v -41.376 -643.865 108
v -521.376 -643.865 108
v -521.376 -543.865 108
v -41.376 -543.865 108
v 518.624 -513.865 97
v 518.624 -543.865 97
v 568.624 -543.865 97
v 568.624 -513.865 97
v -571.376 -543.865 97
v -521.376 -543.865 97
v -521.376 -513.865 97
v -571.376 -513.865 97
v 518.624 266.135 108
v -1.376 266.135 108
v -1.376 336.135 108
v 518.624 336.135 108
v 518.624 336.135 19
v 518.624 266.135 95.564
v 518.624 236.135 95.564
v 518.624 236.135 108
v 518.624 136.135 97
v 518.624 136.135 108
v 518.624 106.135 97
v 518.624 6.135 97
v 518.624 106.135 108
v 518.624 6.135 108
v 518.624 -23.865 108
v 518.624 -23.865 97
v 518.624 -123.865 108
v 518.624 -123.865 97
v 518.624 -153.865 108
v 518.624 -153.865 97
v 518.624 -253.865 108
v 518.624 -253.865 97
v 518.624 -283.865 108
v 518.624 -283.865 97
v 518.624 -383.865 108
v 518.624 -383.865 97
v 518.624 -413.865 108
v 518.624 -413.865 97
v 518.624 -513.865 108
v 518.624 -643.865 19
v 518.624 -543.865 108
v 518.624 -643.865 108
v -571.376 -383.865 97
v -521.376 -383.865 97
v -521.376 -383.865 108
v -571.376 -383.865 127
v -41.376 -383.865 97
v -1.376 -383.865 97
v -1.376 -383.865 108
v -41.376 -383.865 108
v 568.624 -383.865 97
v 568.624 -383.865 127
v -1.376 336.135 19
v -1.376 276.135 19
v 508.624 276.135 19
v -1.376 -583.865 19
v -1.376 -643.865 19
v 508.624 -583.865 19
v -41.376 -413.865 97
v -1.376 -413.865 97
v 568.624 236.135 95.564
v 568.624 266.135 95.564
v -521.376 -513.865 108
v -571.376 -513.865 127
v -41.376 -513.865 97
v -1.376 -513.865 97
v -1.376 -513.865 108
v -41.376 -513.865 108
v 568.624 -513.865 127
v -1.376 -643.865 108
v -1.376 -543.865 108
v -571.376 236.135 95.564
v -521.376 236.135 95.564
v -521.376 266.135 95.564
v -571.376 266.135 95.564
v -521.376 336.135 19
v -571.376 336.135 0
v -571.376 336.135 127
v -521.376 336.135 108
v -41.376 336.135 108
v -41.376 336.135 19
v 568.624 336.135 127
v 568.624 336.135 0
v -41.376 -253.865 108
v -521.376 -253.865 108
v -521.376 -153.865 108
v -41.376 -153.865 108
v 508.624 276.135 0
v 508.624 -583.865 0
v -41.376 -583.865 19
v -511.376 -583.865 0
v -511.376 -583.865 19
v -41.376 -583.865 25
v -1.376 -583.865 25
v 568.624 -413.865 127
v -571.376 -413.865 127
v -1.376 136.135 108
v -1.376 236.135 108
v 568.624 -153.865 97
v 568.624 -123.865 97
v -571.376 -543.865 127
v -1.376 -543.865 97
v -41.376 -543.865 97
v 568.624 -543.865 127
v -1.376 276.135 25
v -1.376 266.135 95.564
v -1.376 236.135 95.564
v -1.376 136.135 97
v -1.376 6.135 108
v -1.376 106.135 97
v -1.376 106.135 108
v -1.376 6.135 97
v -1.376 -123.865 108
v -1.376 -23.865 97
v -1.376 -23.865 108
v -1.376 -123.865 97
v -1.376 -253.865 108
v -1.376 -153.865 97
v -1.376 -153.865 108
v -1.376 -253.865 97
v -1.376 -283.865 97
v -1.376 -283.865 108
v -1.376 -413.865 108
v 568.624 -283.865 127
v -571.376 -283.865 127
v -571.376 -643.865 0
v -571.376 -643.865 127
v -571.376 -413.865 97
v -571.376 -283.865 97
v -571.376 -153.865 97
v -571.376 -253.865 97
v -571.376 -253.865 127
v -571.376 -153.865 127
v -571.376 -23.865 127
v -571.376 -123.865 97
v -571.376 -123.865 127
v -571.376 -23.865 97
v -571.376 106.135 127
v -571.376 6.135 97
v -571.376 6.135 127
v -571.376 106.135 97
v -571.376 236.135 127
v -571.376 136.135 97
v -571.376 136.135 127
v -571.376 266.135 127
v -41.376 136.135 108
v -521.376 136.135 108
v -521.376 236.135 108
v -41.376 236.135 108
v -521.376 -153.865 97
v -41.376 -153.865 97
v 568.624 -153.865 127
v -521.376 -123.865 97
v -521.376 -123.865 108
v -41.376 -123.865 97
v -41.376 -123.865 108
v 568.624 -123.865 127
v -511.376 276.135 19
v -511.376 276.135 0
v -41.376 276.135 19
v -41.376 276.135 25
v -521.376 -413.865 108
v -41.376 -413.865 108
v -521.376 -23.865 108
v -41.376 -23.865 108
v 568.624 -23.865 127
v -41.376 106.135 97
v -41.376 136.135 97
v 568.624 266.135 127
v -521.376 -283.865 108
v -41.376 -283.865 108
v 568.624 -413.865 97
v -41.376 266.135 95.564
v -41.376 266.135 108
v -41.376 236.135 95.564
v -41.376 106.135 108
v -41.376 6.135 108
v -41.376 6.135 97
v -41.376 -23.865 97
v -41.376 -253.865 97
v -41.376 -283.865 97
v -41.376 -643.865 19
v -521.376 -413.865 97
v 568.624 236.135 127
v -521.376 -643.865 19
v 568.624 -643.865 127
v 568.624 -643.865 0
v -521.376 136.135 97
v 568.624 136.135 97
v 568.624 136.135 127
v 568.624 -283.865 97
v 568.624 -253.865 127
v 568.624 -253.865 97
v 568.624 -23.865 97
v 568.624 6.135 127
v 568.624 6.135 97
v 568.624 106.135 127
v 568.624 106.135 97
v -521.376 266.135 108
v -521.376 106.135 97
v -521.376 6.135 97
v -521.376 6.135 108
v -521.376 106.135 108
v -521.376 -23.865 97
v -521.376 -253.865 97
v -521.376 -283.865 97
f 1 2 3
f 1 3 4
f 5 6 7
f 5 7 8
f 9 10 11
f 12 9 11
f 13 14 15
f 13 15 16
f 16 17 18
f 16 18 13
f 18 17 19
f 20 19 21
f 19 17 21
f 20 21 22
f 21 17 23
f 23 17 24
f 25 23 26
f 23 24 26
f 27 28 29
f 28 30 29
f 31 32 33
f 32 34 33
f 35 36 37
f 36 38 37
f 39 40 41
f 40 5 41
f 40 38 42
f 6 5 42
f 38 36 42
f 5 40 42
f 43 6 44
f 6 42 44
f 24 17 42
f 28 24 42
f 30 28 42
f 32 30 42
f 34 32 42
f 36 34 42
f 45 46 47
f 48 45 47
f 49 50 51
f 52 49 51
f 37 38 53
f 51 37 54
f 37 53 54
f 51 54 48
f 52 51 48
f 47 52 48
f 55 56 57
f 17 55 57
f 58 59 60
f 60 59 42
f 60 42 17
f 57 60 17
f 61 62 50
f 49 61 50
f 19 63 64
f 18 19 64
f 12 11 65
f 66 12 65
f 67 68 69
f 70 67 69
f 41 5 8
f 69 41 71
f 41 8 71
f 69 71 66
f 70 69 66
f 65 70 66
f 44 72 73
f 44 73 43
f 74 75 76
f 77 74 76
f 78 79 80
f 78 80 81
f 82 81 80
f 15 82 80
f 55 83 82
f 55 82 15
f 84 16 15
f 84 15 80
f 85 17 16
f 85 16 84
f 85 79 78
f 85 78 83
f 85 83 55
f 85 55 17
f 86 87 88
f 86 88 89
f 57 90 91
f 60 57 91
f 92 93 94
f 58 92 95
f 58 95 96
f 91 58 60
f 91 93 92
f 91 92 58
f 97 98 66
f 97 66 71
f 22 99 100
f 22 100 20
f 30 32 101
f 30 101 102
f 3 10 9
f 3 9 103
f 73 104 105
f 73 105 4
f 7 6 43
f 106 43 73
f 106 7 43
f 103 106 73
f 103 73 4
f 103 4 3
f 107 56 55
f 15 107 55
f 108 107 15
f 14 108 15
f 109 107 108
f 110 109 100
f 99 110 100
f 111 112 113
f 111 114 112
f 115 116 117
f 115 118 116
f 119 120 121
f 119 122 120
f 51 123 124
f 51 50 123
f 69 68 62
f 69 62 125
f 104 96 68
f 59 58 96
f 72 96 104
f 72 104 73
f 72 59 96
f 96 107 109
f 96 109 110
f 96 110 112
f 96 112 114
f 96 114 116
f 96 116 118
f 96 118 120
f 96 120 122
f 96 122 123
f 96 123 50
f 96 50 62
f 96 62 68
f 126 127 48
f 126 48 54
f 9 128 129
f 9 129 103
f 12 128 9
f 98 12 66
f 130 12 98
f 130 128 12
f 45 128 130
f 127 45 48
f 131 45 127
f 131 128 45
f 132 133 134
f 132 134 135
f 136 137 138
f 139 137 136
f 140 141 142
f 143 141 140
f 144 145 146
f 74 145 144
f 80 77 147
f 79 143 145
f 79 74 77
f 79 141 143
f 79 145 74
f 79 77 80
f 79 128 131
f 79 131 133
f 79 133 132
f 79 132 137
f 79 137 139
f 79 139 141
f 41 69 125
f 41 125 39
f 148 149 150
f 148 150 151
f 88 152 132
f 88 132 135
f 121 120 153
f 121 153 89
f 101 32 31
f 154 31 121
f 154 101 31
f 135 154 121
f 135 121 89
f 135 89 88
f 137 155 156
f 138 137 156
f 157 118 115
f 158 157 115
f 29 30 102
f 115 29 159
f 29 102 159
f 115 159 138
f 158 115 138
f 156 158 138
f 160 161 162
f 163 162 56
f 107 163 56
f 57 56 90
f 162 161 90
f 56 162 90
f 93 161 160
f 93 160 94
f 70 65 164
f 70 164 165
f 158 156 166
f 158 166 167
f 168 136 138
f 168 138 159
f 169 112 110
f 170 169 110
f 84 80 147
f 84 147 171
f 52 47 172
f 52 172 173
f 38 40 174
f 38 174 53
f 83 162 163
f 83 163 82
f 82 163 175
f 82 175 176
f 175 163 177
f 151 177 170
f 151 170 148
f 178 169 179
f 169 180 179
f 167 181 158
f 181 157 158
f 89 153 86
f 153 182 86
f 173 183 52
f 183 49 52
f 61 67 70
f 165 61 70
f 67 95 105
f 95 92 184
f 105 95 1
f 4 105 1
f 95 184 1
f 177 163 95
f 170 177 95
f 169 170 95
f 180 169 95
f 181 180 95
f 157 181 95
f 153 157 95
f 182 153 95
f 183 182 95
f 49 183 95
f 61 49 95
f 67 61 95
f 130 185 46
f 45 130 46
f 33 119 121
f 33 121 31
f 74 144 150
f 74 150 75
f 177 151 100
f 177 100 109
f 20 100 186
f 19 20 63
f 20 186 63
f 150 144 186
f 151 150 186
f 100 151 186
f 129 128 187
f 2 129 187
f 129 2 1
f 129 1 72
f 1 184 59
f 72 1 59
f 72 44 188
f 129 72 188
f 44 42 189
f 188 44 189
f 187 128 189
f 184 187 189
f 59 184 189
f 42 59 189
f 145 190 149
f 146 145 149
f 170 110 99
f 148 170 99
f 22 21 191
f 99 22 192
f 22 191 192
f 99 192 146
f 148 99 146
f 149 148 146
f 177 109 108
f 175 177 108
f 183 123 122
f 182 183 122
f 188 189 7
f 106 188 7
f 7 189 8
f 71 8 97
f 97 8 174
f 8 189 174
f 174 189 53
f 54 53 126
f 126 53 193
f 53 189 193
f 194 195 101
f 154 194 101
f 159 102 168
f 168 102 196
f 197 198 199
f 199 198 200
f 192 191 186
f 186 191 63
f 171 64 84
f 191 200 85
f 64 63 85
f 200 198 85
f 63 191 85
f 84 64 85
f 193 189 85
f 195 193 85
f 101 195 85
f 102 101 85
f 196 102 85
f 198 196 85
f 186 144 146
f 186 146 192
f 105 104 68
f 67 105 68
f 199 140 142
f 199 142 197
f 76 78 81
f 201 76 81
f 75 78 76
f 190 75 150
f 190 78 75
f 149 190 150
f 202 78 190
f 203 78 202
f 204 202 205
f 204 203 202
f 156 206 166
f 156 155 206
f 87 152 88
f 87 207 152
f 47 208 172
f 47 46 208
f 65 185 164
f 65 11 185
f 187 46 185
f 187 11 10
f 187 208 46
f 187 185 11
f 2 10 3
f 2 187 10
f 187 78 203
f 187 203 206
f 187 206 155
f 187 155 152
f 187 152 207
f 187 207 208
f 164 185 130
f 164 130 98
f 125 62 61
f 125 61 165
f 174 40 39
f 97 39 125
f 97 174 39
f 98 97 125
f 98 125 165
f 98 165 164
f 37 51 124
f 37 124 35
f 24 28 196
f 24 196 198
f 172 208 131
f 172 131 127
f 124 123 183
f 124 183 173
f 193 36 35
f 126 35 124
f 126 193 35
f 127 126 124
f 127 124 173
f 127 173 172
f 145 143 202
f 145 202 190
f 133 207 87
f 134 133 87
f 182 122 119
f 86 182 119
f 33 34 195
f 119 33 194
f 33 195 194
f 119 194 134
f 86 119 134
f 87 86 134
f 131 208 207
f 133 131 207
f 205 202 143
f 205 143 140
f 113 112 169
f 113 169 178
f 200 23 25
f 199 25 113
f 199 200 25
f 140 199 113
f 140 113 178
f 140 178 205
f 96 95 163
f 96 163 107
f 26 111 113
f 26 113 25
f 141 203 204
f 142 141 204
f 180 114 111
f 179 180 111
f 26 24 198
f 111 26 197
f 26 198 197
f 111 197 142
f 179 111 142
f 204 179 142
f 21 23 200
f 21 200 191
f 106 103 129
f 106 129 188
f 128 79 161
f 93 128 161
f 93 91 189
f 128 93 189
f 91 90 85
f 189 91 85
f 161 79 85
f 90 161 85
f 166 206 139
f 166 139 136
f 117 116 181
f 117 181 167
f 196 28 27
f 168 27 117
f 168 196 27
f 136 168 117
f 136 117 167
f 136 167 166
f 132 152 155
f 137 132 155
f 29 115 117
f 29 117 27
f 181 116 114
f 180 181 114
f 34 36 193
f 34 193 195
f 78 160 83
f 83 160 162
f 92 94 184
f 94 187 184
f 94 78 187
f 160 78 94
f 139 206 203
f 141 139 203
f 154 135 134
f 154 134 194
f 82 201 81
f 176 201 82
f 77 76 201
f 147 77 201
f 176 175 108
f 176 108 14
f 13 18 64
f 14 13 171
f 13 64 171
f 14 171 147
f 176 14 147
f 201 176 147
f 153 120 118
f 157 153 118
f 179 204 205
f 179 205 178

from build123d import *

# Parameters (mm, degrees)
F0_W     = 1140
F0_H     = 980
F1_DEPTH = 127
F2_W     = 480
F2_H     = 89
F2_W_2   = 520
F3_DEPTH = 980.001
F4_W     = 30
F4_H     = 30
F5_DEPTH = 1140.001
F6_W     = 1020
F6_H     = 860
F7_DEPTH = 25


with BuildPart() as f1:
    # F0 (on Top) → F1 (new body)
    with BuildSketch(Plane.XY):
        with Locations((-1.375834, -153.865348)):
            Rectangle(F0_W, F0_H)
    extrude(amount=F1_DEPTH)

    # F2 (on face) → F3 (cut, through all)
    with BuildSketch(Plane.XZ.offset(643.865348)):
        with Locations((-281.375834, 63.5)):
            Rectangle(F2_W, F2_H)
        with Locations((258.624166, 63.5)):
            Rectangle(F2_W_2, F2_H)
    extrude(amount=-F3_DEPTH, mode=Mode.SUBTRACT)

    # F4 (on face) → F5 (cut, through all)
    with BuildSketch(Plane.YZ.offset(568.624166)):
        with Locations((-528.865348, 112)):
            Rectangle(F4_W, F4_H)
        Polygon((266.134652, 127), (236.134652, 127), (236.134652, 97), (236.134652, 95.564112), (266.134652, 95.564112), align=None)
        with Locations((-398.865348, 112)):
            Rectangle(F4_W, F4_H)
        with Locations((-268.865348, 112)):
            Rectangle(F4_W, F4_H)
        with Locations((-138.865348, 112)):
            Rectangle(F4_W, F4_H)
        with Locations((-8.865348, 112)):
            Rectangle(F4_W, F4_H)
        with Locations((121.134652, 112)):
            Rectangle(F4_W, F4_H)
    extrude(amount=-F5_DEPTH, mode=Mode.SUBTRACT)

    # F6 (on face) → F7 (cut)
    with BuildSketch(Plane(origin=(0, 0, 0), x_dir=(1, 0, 0), z_dir=(0, 0, -1))):
        with Locations((-1.375834, 153.865348)):
            Rectangle(F6_W, F6_H)
    extrude(amount=-F7_DEPTH, mode=Mode.SUBTRACT)


solid = f1.part
